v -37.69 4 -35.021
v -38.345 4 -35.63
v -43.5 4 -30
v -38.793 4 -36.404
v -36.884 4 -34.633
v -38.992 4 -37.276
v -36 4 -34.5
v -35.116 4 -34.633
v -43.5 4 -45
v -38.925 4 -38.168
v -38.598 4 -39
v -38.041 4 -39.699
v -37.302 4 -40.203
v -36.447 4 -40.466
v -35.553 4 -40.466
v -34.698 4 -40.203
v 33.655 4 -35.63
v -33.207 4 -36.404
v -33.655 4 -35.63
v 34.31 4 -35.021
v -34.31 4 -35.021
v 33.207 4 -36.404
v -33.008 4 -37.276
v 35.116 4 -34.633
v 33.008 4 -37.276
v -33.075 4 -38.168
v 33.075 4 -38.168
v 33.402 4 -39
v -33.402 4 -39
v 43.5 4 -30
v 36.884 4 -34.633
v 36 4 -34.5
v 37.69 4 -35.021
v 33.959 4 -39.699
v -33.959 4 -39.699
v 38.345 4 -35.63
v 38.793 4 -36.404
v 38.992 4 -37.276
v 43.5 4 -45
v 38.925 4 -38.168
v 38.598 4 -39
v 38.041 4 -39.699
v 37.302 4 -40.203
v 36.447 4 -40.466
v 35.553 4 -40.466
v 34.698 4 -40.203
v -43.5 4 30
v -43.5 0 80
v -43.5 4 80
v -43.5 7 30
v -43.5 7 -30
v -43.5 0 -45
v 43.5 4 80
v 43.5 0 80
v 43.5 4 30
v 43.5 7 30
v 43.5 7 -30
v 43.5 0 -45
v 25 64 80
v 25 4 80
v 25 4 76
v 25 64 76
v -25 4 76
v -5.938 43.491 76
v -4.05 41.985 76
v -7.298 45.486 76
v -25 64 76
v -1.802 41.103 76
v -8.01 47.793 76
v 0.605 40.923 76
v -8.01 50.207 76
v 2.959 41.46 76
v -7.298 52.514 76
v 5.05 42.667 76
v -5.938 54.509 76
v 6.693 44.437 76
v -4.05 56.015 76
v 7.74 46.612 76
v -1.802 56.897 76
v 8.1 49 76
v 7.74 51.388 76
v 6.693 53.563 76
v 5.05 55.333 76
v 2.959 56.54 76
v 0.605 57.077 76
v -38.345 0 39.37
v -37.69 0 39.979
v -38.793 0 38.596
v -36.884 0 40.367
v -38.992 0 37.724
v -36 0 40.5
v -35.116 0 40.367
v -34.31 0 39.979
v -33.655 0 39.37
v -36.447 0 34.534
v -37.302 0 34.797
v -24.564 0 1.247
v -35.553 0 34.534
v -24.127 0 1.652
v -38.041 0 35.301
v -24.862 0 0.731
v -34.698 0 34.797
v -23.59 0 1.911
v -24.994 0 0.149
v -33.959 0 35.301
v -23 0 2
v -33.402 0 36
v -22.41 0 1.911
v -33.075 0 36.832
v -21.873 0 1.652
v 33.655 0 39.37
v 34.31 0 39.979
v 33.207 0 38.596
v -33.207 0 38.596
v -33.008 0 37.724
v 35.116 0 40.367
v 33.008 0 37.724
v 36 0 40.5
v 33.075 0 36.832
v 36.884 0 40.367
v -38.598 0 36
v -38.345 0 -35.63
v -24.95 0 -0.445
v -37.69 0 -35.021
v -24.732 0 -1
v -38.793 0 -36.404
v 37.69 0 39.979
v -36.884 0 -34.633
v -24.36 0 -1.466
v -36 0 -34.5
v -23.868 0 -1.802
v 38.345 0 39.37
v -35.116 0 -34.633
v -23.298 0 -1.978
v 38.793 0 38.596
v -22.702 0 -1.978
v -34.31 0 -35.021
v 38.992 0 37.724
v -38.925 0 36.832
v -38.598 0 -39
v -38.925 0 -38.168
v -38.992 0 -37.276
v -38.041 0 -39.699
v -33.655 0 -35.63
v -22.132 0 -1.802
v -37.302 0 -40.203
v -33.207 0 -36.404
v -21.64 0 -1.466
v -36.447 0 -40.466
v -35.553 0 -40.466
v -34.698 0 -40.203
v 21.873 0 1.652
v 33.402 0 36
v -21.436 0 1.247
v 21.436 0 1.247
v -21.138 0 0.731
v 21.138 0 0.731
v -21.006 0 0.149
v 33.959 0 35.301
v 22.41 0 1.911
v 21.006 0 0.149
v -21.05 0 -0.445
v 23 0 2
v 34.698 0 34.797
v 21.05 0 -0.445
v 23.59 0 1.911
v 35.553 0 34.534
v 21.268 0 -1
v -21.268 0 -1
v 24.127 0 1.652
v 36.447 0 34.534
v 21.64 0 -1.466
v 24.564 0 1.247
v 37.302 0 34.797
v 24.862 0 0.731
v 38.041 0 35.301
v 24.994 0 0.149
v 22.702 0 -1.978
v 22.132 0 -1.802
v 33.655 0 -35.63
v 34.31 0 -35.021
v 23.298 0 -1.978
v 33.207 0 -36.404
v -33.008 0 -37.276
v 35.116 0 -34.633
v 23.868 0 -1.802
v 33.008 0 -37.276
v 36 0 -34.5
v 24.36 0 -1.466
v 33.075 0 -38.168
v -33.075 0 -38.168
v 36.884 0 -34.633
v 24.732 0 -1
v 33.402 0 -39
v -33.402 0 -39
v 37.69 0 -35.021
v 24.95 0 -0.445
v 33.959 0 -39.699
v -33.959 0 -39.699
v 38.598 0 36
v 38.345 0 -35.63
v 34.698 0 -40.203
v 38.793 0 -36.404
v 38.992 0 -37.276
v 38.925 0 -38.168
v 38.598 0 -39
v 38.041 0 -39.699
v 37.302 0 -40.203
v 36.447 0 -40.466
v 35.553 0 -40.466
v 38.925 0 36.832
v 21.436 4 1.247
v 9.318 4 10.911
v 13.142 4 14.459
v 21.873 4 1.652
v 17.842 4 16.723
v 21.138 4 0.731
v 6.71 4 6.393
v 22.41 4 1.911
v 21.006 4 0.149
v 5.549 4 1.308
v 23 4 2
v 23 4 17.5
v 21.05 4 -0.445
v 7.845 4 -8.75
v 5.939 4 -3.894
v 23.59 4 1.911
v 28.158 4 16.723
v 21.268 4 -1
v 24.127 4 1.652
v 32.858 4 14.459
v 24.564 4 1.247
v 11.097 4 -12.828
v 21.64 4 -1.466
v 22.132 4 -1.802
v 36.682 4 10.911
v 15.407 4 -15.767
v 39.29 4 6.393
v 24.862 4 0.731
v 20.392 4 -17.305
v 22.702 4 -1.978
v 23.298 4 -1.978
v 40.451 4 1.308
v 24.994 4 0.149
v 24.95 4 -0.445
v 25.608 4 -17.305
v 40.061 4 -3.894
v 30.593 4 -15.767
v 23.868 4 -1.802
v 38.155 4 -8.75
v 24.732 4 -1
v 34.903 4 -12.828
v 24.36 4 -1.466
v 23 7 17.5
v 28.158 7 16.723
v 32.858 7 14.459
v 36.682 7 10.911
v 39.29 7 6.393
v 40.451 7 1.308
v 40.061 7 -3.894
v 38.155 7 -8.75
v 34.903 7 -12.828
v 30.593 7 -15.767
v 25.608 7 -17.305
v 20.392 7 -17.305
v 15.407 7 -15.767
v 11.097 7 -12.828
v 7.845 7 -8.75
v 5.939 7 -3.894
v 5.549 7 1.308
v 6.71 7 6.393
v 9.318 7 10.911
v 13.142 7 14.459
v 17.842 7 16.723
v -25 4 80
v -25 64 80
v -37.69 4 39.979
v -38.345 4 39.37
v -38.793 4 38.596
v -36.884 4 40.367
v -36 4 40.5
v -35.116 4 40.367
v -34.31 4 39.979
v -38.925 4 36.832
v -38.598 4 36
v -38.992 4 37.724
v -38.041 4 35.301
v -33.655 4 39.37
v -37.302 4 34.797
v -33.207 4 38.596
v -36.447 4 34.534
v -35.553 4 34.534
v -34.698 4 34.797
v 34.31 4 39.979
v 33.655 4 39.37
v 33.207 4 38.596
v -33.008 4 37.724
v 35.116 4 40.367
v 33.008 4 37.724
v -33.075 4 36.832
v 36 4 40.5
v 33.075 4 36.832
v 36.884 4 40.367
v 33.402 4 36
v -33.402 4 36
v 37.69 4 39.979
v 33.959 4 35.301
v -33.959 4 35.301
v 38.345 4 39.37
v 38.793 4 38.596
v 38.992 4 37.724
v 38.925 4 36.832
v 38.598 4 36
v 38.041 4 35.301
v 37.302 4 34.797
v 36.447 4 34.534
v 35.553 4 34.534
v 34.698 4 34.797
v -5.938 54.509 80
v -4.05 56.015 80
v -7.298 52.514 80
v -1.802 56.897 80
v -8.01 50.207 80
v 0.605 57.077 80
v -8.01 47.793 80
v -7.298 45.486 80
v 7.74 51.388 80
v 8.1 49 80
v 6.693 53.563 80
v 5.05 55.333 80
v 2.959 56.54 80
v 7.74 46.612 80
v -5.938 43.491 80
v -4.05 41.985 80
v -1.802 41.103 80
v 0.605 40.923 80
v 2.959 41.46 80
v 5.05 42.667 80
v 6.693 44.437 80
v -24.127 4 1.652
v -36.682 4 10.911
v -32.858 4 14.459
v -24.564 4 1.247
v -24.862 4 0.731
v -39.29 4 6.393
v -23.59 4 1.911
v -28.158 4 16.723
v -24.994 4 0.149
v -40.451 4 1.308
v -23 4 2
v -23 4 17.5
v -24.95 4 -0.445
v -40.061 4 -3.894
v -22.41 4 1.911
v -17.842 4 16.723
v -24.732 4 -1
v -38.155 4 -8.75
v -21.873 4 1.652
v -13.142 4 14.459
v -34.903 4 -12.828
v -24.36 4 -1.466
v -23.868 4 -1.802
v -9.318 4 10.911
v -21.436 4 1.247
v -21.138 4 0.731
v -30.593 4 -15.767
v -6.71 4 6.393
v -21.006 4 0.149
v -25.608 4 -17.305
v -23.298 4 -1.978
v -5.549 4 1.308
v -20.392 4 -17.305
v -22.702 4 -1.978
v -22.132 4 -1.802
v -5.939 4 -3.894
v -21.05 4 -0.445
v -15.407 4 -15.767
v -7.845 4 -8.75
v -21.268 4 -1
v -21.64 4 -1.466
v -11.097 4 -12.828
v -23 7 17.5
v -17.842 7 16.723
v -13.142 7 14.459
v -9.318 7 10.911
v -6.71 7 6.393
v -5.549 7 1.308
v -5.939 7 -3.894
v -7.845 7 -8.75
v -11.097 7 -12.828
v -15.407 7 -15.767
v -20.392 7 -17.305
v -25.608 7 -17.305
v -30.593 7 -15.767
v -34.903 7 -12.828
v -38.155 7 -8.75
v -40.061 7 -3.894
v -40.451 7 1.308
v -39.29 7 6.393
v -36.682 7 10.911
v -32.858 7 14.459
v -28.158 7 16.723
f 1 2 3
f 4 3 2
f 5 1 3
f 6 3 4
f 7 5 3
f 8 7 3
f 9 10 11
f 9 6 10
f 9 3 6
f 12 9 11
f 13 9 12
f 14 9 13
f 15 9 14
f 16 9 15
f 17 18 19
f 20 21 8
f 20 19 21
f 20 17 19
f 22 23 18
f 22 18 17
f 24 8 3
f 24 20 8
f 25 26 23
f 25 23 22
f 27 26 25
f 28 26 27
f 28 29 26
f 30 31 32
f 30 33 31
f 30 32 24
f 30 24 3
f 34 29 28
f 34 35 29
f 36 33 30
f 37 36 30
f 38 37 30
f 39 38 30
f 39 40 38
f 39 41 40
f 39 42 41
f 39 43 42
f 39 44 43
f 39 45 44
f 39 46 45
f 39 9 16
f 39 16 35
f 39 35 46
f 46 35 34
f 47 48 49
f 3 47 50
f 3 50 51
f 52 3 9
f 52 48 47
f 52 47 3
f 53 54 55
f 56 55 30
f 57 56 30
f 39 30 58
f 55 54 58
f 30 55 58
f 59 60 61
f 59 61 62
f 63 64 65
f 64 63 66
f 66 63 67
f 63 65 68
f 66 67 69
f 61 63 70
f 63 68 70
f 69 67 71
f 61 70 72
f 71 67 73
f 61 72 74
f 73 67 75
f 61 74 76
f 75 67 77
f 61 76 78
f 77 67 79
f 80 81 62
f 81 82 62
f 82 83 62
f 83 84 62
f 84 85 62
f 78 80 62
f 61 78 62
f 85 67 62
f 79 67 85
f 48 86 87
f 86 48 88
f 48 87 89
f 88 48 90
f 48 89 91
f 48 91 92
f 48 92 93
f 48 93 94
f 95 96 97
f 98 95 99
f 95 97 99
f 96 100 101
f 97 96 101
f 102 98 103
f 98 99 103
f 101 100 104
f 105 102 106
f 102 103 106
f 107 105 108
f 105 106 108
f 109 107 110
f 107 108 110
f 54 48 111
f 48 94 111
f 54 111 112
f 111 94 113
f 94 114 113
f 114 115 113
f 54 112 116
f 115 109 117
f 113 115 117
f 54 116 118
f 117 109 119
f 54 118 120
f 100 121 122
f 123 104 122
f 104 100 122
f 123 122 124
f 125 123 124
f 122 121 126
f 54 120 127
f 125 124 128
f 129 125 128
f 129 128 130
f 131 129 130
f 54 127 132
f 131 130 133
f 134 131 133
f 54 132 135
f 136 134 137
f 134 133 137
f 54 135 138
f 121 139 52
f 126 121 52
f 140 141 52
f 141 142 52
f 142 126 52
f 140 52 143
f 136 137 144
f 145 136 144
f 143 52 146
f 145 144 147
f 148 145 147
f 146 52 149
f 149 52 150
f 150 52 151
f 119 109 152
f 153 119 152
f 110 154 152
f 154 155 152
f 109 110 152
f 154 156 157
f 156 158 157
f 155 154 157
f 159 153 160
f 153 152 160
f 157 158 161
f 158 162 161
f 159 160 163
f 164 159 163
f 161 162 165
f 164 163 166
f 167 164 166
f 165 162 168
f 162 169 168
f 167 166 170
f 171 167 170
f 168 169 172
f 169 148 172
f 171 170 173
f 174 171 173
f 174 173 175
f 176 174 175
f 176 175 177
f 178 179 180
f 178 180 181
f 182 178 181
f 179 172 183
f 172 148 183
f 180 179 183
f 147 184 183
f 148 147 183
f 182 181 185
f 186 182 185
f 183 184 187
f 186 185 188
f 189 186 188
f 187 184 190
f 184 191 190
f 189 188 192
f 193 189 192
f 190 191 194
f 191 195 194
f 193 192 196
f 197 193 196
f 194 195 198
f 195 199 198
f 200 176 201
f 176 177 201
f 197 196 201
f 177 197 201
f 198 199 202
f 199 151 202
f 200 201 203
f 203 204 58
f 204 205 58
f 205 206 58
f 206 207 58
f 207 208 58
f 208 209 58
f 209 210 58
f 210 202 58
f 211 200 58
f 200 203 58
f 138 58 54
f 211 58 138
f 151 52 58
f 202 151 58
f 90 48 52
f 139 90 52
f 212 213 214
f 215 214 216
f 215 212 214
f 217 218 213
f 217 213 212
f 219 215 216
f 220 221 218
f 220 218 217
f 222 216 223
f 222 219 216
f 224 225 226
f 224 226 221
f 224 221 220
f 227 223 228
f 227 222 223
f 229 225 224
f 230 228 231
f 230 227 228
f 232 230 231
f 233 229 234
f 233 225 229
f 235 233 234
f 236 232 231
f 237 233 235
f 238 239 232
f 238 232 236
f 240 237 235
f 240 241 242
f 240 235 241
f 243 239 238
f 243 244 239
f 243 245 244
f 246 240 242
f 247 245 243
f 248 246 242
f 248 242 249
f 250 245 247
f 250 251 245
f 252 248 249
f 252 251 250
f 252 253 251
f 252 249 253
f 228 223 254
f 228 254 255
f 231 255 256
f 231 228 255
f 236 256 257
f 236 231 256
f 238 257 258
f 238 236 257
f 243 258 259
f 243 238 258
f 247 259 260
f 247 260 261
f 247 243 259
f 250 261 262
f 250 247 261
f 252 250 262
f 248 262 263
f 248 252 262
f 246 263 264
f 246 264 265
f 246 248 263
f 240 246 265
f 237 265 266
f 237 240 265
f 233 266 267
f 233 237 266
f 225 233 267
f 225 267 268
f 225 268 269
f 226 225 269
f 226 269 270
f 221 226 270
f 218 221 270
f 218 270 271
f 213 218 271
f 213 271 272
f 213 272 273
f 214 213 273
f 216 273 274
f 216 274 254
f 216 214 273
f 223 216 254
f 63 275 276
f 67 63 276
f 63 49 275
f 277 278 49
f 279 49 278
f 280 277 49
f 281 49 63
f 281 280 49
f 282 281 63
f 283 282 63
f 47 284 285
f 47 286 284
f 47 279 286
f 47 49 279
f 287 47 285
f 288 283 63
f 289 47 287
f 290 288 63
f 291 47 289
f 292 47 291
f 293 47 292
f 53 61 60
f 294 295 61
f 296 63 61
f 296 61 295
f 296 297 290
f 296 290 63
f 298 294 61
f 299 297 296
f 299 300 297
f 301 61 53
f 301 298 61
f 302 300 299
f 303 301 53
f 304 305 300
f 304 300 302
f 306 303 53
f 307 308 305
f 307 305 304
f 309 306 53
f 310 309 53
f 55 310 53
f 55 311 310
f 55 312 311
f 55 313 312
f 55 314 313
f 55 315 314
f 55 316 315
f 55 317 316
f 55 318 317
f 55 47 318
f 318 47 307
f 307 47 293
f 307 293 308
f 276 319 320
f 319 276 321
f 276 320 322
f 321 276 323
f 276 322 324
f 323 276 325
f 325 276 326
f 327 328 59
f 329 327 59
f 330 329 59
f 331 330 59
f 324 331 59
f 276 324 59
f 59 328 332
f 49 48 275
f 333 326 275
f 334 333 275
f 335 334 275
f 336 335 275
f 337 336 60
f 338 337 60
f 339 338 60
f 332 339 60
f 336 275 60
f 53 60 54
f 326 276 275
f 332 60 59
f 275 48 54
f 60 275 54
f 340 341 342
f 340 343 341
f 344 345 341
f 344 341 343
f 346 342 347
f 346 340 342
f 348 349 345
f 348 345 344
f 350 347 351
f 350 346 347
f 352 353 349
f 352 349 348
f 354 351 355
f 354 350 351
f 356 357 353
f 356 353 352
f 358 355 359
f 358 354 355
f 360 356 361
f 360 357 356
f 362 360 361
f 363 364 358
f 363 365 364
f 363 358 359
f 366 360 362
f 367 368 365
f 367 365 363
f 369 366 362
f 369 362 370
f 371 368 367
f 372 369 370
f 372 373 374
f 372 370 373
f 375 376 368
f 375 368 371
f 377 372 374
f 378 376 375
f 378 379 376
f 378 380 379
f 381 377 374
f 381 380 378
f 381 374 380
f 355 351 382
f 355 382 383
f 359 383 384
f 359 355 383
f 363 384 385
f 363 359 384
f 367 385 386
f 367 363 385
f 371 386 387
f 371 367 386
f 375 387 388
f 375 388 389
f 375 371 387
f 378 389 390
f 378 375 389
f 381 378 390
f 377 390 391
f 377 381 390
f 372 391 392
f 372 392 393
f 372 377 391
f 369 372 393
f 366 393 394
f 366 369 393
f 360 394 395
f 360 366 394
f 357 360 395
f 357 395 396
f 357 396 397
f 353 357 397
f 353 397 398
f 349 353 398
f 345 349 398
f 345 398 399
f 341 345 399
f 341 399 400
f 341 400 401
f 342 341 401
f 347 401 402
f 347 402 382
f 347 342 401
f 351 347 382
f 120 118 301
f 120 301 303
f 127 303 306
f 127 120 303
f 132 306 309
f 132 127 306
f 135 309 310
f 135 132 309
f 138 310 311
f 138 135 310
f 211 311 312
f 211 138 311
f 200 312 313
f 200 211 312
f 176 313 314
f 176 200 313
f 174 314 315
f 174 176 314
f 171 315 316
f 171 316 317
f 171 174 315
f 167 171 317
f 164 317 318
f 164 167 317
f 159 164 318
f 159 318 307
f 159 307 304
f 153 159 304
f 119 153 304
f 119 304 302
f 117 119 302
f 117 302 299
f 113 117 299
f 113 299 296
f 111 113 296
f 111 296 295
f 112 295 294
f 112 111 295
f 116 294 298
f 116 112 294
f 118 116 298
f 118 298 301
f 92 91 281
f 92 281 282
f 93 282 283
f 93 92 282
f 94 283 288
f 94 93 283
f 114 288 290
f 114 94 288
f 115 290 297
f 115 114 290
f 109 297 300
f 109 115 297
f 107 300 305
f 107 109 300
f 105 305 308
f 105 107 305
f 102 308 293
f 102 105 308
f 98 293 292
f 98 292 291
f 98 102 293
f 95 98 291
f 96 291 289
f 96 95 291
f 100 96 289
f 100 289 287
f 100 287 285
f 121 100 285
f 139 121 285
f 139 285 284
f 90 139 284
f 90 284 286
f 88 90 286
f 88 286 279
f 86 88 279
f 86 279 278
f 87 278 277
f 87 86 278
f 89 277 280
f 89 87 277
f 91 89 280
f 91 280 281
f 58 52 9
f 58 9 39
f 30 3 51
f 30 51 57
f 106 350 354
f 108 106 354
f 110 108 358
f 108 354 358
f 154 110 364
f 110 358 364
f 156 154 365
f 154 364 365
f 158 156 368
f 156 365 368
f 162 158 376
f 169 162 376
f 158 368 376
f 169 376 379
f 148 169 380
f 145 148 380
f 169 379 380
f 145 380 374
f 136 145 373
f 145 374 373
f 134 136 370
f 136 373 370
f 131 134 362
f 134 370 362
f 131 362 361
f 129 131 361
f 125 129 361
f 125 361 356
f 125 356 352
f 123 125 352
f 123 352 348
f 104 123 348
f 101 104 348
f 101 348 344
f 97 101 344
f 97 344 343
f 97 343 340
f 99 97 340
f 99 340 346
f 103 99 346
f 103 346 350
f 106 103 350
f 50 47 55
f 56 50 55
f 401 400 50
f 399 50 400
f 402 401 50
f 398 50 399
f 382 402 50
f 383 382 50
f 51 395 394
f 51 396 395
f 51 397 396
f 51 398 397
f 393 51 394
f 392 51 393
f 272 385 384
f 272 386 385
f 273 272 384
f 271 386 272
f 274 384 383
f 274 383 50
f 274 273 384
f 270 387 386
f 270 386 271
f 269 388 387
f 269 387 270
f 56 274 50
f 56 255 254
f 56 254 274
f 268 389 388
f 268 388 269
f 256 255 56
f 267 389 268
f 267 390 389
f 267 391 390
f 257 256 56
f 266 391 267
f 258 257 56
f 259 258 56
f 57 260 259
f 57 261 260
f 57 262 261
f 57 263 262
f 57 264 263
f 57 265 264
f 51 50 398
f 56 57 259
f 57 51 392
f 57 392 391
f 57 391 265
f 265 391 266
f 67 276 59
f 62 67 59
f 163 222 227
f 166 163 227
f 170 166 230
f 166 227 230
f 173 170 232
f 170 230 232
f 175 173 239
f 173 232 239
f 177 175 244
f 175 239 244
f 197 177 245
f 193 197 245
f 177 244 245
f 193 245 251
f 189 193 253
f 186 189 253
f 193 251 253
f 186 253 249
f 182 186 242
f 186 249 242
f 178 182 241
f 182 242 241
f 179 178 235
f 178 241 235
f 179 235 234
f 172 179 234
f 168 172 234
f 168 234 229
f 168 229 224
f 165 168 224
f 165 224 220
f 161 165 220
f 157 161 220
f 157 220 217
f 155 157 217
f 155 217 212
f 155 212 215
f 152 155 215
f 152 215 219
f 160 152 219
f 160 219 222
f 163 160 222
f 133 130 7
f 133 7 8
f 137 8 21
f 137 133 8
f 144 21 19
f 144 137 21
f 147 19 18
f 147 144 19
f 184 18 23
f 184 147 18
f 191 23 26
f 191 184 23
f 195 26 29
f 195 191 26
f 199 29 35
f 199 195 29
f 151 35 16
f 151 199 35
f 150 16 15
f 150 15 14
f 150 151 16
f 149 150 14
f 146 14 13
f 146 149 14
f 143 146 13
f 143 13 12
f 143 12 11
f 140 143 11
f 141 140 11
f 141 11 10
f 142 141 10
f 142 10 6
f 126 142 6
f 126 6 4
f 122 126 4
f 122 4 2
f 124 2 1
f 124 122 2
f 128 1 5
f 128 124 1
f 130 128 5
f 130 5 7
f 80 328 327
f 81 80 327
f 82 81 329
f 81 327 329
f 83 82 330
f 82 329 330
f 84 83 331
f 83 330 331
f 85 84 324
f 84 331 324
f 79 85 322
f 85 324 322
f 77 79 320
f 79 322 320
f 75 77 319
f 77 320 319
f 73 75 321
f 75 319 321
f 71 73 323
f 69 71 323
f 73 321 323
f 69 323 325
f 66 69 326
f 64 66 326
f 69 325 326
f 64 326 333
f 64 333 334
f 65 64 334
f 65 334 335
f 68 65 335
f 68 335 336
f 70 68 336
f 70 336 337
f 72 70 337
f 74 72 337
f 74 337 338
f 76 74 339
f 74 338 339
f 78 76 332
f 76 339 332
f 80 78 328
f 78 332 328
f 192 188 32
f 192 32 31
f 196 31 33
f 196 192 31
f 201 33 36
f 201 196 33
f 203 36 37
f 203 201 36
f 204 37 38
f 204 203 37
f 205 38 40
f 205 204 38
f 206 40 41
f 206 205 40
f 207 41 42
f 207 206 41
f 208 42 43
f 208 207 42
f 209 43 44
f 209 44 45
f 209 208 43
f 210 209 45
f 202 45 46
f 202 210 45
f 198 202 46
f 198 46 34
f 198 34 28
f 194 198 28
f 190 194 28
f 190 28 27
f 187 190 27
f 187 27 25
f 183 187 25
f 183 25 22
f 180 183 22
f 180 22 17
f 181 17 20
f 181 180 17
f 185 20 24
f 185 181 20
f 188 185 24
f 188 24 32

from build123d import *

# Parameters (mm, degrees)
SKETCH_1_W          = 87
SKETCH_1_H          = 90
SKETCH_1_R          = 3
SKETCH_1_H_2        = 35
EXTRUDE_1_DEPTH     = 4
SKETCH_3_W          = 87
SKETCH_3_H          = 60
SKETCH_3_R          = 17.5
EXTRUDE_2_DEPTH     = 3
SKETCH_4_R          = 2
CUT_EXTRUDE_1_DEPTH = 92.149602303
SKETCH_5_W          = 50
SKETCH_5_H          = 60
SKETCH_5_R          = 8.1
EXTRUDE_3_DEPTH     = 4


with BuildPart() as part:
    # 草图1 → 凸台-拉伸1 (new body)
    # profile 1 of 2: a face of its own
    with BuildSketch(Plane(origin=(0, 0, 0), x_dir=(1, 0, 0), z_dir=(0, 1, 0))):
        Rectangle(SKETCH_1_W, SKETCH_1_H)
        with Locations(Location((36, 37.5, 0), (0, 0, 270))):
            Circle(SKETCH_1_R, mode=Mode.SUBTRACT)
        with Locations(Location((-36, 37.5, 0), (0, 0, 270))):
            Circle(SKETCH_1_R, mode=Mode.SUBTRACT)
        with Locations(Location((36, -37.5, 0), (0, 0, 270))):
            Circle(SKETCH_1_R, mode=Mode.SUBTRACT)
        with Locations(Location((-36, -37.5, 0), (0, 0, 270))):
            Circle(SKETCH_1_R, mode=Mode.SUBTRACT)
    # profile 2 of 2: a face of its own
    with BuildSketch(Plane(origin=(0, 0, 0), x_dir=(1, 0, 0), z_dir=(0, 1, 0))):
        with Locations((0, -62.5)):
            Rectangle(SKETCH_1_W, SKETCH_1_H_2)
    extrude(amount=EXTRUDE_1_DEPTH)

    # 草图3 → 凸台-拉伸2 (add)
    with BuildSketch(Plane(origin=(0, 4, 0), x_dir=(1, 0, 0), z_dir=(0, 1, 0))):
        Rectangle(SKETCH_3_W, SKETCH_3_H)
        with Locations(Location((-23, 0, 0), (0, 0, 270))):
            Circle(SKETCH_3_R, mode=Mode.SUBTRACT)
        with Locations(Location((23, 0, 0), (0, 0, 270))):
            Circle(SKETCH_3_R, mode=Mode.SUBTRACT)
    extrude(amount=EXTRUDE_2_DEPTH)

    # 草图4 → 切除-拉伸1 (cut, through all)
    with BuildSketch(Plane(origin=(0, 4, 0), x_dir=(1, 0, 0), z_dir=(0, 1, 0))):
        with Locations(Location((23, 0, 0), (0, 0, 270))):
            Circle(SKETCH_4_R)
        with Locations(Location((-23, 0, 0), (0, 0, 270))):
            Circle(SKETCH_4_R)
    extrude(amount=-CUT_EXTRUDE_1_DEPTH, mode=Mode.SUBTRACT)

    # 草图5 → 凸台-拉伸3 (add)
    with BuildSketch(Plane.XY.offset(80)):
        with Locations((0, 34)):
            Rectangle(SKETCH_5_W, SKETCH_5_H)
        with Locations((0, 49)):
            Circle(SKETCH_5_R, mode=Mode.SUBTRACT)
    extrude(amount=-EXTRUDE_3_DEPTH)


solid = part.part
